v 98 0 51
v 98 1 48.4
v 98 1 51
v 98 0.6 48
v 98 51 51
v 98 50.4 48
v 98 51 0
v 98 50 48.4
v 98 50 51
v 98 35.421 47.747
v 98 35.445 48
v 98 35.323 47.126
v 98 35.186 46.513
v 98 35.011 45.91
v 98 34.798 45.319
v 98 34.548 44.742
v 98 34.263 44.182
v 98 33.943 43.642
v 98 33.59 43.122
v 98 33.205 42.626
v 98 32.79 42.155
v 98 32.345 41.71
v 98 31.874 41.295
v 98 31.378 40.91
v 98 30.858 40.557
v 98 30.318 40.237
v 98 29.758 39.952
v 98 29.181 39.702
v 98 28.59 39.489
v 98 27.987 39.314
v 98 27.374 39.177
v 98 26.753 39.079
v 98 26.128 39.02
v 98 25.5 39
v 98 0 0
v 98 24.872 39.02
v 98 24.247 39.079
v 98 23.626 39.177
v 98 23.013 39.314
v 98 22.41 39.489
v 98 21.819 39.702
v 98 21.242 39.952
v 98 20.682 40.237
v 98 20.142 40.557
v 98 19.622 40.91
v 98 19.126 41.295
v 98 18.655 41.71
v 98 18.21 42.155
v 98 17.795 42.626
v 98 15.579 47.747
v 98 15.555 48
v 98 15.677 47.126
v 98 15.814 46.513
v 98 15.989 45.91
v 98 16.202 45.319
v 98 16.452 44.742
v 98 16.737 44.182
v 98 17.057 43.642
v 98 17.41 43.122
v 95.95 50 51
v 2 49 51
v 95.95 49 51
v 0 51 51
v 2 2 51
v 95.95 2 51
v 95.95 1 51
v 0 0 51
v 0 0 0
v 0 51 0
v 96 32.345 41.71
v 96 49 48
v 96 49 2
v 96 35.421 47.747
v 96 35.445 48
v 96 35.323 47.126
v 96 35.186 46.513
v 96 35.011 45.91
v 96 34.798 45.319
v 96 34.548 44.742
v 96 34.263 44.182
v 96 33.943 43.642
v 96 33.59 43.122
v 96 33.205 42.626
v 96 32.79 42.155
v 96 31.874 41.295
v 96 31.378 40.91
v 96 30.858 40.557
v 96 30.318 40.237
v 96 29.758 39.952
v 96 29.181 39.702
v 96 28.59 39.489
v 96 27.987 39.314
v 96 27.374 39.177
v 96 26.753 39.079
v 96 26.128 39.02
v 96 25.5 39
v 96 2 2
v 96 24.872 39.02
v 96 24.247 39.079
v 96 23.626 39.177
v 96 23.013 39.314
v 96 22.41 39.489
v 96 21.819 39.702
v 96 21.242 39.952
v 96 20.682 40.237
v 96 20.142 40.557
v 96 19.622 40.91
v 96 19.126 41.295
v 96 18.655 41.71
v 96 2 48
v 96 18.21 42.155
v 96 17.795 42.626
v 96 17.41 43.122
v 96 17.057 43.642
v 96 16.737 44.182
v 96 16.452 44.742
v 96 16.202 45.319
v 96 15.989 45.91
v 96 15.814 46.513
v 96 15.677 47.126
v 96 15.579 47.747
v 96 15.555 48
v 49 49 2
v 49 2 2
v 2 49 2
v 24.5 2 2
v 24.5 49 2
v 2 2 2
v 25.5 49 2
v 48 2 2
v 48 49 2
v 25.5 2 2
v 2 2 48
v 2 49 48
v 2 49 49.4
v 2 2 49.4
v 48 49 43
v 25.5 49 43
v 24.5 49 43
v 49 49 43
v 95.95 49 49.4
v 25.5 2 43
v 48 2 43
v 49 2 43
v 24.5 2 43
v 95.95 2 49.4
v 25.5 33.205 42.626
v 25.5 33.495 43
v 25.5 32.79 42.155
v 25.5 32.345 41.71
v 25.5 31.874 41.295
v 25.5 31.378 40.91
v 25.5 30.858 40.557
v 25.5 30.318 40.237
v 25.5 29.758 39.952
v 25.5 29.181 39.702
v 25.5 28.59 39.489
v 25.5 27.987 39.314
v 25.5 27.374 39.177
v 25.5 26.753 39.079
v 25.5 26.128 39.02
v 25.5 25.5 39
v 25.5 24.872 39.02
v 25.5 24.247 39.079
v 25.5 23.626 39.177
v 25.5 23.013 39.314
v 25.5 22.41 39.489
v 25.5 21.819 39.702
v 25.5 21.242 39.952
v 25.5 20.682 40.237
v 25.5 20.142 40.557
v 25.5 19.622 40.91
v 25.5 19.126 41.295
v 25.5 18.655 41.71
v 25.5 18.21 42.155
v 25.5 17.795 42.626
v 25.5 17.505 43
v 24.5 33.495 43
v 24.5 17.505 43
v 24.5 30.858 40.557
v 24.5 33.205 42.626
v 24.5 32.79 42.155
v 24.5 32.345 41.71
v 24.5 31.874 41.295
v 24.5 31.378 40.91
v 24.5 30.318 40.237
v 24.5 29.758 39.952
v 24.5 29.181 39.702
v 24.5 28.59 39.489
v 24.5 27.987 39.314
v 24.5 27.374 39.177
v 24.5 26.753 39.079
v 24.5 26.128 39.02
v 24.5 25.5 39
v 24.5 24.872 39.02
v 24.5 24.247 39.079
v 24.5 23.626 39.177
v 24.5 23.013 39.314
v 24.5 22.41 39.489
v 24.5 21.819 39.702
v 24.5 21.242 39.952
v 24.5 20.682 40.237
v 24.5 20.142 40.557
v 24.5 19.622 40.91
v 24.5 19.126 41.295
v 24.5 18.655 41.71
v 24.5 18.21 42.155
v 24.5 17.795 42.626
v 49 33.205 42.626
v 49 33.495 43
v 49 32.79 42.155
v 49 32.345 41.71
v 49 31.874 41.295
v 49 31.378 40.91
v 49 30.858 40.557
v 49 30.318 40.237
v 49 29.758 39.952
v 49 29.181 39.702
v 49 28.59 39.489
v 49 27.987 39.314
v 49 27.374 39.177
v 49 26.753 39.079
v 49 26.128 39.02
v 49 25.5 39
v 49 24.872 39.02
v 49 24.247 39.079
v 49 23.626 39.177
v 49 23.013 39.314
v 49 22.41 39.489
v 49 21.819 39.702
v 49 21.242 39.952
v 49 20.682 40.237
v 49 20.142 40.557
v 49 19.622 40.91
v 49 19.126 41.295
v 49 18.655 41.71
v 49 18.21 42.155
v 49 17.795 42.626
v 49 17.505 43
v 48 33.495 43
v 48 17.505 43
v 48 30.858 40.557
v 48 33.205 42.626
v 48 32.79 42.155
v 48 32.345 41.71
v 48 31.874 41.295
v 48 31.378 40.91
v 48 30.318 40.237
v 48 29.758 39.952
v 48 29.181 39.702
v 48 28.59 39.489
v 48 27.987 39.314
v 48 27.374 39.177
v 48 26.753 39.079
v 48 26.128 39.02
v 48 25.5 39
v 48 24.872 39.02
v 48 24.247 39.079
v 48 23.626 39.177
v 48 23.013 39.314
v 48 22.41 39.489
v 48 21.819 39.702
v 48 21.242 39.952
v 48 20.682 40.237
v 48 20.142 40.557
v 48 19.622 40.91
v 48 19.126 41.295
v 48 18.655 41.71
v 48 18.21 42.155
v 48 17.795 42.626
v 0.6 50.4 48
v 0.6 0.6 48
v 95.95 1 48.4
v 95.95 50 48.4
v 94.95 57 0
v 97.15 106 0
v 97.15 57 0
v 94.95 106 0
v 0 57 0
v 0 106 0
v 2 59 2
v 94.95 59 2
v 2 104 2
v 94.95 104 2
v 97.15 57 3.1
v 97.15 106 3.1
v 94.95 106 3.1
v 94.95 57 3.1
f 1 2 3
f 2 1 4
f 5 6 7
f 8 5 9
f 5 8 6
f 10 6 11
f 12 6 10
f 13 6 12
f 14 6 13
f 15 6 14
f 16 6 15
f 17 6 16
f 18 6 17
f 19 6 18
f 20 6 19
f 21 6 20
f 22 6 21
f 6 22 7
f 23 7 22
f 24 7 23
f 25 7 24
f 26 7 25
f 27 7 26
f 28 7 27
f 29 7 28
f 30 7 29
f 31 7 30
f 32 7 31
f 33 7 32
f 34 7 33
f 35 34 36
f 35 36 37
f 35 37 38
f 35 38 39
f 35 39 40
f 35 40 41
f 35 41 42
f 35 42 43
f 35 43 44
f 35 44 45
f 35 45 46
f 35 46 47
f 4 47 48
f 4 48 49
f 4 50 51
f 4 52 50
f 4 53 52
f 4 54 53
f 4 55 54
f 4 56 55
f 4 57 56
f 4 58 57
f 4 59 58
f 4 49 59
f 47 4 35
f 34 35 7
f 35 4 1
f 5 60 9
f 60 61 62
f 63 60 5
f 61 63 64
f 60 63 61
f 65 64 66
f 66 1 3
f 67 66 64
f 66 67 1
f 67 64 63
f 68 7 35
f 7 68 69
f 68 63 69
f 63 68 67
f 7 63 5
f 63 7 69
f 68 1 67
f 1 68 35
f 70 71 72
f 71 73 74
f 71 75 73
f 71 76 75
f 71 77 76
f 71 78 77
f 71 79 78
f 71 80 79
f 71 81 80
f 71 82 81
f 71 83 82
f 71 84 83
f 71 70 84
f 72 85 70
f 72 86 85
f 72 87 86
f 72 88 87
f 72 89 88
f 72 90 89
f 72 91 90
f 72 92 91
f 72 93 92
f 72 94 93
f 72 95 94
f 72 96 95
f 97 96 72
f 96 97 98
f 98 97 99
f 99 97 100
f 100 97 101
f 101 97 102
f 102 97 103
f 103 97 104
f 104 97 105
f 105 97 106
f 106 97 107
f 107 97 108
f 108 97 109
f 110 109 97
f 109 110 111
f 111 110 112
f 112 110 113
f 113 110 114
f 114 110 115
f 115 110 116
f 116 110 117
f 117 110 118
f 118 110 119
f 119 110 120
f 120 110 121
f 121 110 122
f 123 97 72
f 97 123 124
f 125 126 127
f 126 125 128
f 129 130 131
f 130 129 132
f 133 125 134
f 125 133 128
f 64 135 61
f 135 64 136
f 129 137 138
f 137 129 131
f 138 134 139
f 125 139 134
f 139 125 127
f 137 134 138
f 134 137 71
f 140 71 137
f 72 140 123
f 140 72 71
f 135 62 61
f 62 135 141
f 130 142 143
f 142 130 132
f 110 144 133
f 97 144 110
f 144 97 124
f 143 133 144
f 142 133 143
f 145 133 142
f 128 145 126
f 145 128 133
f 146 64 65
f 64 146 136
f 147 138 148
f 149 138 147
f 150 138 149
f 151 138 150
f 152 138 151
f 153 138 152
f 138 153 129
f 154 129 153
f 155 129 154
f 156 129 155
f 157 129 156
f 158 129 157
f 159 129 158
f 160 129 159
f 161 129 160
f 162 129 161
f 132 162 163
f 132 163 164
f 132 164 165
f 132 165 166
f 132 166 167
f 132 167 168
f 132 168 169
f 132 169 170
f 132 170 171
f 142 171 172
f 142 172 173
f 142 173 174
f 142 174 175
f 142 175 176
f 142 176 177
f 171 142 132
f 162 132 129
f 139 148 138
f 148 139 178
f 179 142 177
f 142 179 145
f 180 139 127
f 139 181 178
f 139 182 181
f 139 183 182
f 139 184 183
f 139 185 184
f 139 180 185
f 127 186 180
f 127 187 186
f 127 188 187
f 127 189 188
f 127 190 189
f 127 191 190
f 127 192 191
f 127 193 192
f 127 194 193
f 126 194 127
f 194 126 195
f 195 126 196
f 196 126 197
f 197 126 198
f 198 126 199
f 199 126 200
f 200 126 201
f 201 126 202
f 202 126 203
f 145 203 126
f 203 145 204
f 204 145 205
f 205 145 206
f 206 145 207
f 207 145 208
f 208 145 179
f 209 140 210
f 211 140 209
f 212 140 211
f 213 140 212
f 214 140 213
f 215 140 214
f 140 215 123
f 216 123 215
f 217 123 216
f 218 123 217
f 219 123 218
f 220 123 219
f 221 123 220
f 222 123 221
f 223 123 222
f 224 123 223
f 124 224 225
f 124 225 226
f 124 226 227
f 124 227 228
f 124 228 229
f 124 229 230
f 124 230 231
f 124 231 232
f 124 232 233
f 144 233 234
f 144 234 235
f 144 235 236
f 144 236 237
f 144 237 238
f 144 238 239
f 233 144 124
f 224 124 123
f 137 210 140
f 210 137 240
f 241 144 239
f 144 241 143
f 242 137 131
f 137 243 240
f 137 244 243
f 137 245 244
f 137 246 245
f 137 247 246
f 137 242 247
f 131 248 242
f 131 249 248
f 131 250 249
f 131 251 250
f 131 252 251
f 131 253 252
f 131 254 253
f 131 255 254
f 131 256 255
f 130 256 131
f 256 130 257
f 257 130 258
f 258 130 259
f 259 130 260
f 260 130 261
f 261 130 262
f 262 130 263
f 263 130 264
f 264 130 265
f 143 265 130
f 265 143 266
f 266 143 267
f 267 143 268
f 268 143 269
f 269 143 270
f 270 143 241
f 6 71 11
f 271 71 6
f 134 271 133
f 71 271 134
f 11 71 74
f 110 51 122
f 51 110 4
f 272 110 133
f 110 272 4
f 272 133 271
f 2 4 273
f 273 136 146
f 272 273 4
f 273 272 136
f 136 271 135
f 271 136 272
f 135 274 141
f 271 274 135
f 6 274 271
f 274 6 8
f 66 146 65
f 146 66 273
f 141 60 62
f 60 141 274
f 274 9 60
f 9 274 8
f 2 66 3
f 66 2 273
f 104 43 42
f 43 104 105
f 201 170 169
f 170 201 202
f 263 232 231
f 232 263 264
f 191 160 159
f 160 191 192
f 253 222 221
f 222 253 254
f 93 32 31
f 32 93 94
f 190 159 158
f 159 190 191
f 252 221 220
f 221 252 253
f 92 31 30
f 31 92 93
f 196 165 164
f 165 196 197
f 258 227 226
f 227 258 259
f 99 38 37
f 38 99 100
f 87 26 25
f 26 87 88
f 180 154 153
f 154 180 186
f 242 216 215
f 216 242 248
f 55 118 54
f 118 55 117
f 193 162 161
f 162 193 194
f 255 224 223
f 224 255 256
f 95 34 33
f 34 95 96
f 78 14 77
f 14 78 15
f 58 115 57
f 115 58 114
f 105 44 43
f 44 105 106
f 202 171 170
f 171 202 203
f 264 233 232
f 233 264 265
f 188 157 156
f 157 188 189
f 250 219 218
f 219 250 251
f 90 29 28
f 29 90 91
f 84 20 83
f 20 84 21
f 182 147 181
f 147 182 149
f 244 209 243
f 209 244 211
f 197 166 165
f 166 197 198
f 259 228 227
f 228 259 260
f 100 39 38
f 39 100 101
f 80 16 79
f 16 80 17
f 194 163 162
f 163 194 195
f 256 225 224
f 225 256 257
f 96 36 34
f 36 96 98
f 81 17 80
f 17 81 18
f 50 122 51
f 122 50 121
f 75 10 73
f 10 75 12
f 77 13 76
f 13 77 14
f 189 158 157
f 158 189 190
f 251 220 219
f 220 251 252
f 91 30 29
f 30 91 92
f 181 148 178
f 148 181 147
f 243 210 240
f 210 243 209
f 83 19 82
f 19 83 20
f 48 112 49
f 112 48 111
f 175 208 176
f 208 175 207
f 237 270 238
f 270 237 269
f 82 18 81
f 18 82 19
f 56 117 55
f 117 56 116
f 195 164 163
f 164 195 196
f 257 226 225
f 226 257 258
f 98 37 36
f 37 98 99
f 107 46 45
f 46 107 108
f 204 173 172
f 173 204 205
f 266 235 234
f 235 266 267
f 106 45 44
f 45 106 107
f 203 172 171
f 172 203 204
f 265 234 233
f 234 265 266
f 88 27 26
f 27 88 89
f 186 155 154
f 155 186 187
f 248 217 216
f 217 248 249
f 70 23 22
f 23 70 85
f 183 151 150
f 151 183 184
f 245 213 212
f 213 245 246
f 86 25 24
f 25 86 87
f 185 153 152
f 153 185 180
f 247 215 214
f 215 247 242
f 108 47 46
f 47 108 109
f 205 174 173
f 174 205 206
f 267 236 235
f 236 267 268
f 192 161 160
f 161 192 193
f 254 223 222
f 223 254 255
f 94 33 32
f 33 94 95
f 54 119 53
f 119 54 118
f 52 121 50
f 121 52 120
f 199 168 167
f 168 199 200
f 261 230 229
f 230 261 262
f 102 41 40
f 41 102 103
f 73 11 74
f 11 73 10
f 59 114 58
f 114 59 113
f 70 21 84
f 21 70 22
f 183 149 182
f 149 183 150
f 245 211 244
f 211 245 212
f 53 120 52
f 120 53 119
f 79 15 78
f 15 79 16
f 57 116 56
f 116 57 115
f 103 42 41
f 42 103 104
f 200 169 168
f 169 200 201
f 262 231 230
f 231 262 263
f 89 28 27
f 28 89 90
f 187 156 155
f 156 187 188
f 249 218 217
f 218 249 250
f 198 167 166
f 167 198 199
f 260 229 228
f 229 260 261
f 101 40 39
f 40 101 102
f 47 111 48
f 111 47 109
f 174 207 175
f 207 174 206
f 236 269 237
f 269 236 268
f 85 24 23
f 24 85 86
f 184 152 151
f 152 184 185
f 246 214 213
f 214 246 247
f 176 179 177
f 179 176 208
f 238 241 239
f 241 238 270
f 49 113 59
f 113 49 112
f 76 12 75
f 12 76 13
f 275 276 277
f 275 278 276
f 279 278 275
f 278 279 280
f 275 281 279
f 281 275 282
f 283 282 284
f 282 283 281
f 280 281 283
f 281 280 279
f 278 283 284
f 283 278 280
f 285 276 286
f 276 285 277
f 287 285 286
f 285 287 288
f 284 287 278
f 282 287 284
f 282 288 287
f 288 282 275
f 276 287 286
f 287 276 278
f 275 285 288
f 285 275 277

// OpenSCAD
// file: carcassonne_box.scad
/**
 * @file carcassonne_box.scad
 * @author Conlan Wesson
 * Template for Carcossonne boxes.
 * @copyright Creative Commons Attribution-NonCommercial-ShareAlike 4.0
 */

mm = 1;
cm = 10*mm;

width = 47*mm;
thick = 2.5*mm;
wall = 2*mm;

/**
 * Lid for box.
 * @param count Number of cards.
 * @param columns Number of columns.
 * @param icon Path to icon DXF file.
 * @param rot Icon rotation in degrees.
 * @param mult Icon scale.
 * @param xoff X-offset of icon from center.
 * @param yoff Y-offset of icon from center.
 */
module carcassonne_lid(count, columns=1, icon=false, rot=0, mult=1, xoff=0, yoff=0, g=0){
	length = (thick * count) + ((width/2) - ((thick * count) % (width/2)));
	w = length+(1.5*wall)+.1;
	l = (width*columns)+wall;
	h = wall;
	d = 2;

	CubePoints = [
		[ 0-g, 0-g,   0 ],  //0
		[ w+g, 0-g,   0 ],  //1
		[ w+g, l+g,   0 ],  //2
		[ 0-g, l+g,   0 ],  //3
		[   d,   d, h+g ],  //4
		[   w,   d, h+g ],  //5
		[   w, l-d, h+g ],  //6
		[   d, l-d, h+g ]   //7
	];
	
	CubeFaces = [
		[0,1,2,3],  // bottom
		[4,5,1,0],  // front
		[7,6,5,4],  // top
		[5,6,2,1],  // right
		[6,7,3,2],  // back
		[7,4,0,3]   // left
	];
	
	
	difference(){
		union(){
			polyhedron( CubePoints, CubeFaces );
			translate([w-wall-.15,0,0]) cube([wall+.2,l, (1.5*wall)+.1]);
		}
		if(icon){
			translate([w/2+xoff,l/3+yoff,h-(wall/2)]){
				linear_extrude(height=(wall)+.1){
					rotate(rot) scale(mult) import(icon);
				}
			}
		}
	}
}

/**
 * Carcassonne card box.
 * @param count Number of cards.
 * @param dividers Array of divider positions.
 * @param columns Number of columns.
 */
module carcassonne_box(count, dividers=[], columns=1){
	length = (thick * count) + ((width/2) - ((thick * count) % (width/2)));
	difference(){
		union(){
			difference(){
				// Outer walls
				cube([length+(2*wall), (width*columns)+(2*wall), width+(2*wall)]);
				// Cavity
				translate([wall, wall, wall]){
					cube([length, width*columns, (width+wall)+.1]);
				}
			}
			// Dividers
			for(col = [0:columns-1]){
				for(div = dividers[col]){
					translate([(div*(width/2))+(wall/2), width*col+wall, 0]) cube([wall/2, width, width-(2*wall)]);
				}
				if(col > 0){
					translate([0, width*col+(wall/2), 0]) cube([length+(2*wall), wall/2, width-(2*wall)]);
				}
			}
		}
		union(){
			// Notch
			for(col = [0:columns-1]){
				translate([wall, wall+(width*col), wall]){
					translate([0, width/2, width])
					rotate([0, 90, 0]){
						cylinder(r=10, h=length+(2*wall), $fn=100);
					}
				}
			}
			// Track
			translate([wall/2,wall/2,width+wall/2]) carcassonne_lid(count, columns, g=0.4);
		}
	}
}
// main file
/**
 * @file hillssheep.scad
 * @author Conlan Wesson
 * Hills and Sheep Carcossonne box.
 * @copyright Creative Commons Attribution-NonCommercial-ShareAlike 4.0
 */

include <carcassonne_box.scad>

count = 30;
dividers = [[1, 2]];
columns = 1;

carcassonne_box(count, dividers, columns);
translate([0,width*columns+10,0]) carcassonne_lid(count, columns, icon="hillssheep.dxf", rot=90, mult=-0.075, xoff=-10, yoff=21);
